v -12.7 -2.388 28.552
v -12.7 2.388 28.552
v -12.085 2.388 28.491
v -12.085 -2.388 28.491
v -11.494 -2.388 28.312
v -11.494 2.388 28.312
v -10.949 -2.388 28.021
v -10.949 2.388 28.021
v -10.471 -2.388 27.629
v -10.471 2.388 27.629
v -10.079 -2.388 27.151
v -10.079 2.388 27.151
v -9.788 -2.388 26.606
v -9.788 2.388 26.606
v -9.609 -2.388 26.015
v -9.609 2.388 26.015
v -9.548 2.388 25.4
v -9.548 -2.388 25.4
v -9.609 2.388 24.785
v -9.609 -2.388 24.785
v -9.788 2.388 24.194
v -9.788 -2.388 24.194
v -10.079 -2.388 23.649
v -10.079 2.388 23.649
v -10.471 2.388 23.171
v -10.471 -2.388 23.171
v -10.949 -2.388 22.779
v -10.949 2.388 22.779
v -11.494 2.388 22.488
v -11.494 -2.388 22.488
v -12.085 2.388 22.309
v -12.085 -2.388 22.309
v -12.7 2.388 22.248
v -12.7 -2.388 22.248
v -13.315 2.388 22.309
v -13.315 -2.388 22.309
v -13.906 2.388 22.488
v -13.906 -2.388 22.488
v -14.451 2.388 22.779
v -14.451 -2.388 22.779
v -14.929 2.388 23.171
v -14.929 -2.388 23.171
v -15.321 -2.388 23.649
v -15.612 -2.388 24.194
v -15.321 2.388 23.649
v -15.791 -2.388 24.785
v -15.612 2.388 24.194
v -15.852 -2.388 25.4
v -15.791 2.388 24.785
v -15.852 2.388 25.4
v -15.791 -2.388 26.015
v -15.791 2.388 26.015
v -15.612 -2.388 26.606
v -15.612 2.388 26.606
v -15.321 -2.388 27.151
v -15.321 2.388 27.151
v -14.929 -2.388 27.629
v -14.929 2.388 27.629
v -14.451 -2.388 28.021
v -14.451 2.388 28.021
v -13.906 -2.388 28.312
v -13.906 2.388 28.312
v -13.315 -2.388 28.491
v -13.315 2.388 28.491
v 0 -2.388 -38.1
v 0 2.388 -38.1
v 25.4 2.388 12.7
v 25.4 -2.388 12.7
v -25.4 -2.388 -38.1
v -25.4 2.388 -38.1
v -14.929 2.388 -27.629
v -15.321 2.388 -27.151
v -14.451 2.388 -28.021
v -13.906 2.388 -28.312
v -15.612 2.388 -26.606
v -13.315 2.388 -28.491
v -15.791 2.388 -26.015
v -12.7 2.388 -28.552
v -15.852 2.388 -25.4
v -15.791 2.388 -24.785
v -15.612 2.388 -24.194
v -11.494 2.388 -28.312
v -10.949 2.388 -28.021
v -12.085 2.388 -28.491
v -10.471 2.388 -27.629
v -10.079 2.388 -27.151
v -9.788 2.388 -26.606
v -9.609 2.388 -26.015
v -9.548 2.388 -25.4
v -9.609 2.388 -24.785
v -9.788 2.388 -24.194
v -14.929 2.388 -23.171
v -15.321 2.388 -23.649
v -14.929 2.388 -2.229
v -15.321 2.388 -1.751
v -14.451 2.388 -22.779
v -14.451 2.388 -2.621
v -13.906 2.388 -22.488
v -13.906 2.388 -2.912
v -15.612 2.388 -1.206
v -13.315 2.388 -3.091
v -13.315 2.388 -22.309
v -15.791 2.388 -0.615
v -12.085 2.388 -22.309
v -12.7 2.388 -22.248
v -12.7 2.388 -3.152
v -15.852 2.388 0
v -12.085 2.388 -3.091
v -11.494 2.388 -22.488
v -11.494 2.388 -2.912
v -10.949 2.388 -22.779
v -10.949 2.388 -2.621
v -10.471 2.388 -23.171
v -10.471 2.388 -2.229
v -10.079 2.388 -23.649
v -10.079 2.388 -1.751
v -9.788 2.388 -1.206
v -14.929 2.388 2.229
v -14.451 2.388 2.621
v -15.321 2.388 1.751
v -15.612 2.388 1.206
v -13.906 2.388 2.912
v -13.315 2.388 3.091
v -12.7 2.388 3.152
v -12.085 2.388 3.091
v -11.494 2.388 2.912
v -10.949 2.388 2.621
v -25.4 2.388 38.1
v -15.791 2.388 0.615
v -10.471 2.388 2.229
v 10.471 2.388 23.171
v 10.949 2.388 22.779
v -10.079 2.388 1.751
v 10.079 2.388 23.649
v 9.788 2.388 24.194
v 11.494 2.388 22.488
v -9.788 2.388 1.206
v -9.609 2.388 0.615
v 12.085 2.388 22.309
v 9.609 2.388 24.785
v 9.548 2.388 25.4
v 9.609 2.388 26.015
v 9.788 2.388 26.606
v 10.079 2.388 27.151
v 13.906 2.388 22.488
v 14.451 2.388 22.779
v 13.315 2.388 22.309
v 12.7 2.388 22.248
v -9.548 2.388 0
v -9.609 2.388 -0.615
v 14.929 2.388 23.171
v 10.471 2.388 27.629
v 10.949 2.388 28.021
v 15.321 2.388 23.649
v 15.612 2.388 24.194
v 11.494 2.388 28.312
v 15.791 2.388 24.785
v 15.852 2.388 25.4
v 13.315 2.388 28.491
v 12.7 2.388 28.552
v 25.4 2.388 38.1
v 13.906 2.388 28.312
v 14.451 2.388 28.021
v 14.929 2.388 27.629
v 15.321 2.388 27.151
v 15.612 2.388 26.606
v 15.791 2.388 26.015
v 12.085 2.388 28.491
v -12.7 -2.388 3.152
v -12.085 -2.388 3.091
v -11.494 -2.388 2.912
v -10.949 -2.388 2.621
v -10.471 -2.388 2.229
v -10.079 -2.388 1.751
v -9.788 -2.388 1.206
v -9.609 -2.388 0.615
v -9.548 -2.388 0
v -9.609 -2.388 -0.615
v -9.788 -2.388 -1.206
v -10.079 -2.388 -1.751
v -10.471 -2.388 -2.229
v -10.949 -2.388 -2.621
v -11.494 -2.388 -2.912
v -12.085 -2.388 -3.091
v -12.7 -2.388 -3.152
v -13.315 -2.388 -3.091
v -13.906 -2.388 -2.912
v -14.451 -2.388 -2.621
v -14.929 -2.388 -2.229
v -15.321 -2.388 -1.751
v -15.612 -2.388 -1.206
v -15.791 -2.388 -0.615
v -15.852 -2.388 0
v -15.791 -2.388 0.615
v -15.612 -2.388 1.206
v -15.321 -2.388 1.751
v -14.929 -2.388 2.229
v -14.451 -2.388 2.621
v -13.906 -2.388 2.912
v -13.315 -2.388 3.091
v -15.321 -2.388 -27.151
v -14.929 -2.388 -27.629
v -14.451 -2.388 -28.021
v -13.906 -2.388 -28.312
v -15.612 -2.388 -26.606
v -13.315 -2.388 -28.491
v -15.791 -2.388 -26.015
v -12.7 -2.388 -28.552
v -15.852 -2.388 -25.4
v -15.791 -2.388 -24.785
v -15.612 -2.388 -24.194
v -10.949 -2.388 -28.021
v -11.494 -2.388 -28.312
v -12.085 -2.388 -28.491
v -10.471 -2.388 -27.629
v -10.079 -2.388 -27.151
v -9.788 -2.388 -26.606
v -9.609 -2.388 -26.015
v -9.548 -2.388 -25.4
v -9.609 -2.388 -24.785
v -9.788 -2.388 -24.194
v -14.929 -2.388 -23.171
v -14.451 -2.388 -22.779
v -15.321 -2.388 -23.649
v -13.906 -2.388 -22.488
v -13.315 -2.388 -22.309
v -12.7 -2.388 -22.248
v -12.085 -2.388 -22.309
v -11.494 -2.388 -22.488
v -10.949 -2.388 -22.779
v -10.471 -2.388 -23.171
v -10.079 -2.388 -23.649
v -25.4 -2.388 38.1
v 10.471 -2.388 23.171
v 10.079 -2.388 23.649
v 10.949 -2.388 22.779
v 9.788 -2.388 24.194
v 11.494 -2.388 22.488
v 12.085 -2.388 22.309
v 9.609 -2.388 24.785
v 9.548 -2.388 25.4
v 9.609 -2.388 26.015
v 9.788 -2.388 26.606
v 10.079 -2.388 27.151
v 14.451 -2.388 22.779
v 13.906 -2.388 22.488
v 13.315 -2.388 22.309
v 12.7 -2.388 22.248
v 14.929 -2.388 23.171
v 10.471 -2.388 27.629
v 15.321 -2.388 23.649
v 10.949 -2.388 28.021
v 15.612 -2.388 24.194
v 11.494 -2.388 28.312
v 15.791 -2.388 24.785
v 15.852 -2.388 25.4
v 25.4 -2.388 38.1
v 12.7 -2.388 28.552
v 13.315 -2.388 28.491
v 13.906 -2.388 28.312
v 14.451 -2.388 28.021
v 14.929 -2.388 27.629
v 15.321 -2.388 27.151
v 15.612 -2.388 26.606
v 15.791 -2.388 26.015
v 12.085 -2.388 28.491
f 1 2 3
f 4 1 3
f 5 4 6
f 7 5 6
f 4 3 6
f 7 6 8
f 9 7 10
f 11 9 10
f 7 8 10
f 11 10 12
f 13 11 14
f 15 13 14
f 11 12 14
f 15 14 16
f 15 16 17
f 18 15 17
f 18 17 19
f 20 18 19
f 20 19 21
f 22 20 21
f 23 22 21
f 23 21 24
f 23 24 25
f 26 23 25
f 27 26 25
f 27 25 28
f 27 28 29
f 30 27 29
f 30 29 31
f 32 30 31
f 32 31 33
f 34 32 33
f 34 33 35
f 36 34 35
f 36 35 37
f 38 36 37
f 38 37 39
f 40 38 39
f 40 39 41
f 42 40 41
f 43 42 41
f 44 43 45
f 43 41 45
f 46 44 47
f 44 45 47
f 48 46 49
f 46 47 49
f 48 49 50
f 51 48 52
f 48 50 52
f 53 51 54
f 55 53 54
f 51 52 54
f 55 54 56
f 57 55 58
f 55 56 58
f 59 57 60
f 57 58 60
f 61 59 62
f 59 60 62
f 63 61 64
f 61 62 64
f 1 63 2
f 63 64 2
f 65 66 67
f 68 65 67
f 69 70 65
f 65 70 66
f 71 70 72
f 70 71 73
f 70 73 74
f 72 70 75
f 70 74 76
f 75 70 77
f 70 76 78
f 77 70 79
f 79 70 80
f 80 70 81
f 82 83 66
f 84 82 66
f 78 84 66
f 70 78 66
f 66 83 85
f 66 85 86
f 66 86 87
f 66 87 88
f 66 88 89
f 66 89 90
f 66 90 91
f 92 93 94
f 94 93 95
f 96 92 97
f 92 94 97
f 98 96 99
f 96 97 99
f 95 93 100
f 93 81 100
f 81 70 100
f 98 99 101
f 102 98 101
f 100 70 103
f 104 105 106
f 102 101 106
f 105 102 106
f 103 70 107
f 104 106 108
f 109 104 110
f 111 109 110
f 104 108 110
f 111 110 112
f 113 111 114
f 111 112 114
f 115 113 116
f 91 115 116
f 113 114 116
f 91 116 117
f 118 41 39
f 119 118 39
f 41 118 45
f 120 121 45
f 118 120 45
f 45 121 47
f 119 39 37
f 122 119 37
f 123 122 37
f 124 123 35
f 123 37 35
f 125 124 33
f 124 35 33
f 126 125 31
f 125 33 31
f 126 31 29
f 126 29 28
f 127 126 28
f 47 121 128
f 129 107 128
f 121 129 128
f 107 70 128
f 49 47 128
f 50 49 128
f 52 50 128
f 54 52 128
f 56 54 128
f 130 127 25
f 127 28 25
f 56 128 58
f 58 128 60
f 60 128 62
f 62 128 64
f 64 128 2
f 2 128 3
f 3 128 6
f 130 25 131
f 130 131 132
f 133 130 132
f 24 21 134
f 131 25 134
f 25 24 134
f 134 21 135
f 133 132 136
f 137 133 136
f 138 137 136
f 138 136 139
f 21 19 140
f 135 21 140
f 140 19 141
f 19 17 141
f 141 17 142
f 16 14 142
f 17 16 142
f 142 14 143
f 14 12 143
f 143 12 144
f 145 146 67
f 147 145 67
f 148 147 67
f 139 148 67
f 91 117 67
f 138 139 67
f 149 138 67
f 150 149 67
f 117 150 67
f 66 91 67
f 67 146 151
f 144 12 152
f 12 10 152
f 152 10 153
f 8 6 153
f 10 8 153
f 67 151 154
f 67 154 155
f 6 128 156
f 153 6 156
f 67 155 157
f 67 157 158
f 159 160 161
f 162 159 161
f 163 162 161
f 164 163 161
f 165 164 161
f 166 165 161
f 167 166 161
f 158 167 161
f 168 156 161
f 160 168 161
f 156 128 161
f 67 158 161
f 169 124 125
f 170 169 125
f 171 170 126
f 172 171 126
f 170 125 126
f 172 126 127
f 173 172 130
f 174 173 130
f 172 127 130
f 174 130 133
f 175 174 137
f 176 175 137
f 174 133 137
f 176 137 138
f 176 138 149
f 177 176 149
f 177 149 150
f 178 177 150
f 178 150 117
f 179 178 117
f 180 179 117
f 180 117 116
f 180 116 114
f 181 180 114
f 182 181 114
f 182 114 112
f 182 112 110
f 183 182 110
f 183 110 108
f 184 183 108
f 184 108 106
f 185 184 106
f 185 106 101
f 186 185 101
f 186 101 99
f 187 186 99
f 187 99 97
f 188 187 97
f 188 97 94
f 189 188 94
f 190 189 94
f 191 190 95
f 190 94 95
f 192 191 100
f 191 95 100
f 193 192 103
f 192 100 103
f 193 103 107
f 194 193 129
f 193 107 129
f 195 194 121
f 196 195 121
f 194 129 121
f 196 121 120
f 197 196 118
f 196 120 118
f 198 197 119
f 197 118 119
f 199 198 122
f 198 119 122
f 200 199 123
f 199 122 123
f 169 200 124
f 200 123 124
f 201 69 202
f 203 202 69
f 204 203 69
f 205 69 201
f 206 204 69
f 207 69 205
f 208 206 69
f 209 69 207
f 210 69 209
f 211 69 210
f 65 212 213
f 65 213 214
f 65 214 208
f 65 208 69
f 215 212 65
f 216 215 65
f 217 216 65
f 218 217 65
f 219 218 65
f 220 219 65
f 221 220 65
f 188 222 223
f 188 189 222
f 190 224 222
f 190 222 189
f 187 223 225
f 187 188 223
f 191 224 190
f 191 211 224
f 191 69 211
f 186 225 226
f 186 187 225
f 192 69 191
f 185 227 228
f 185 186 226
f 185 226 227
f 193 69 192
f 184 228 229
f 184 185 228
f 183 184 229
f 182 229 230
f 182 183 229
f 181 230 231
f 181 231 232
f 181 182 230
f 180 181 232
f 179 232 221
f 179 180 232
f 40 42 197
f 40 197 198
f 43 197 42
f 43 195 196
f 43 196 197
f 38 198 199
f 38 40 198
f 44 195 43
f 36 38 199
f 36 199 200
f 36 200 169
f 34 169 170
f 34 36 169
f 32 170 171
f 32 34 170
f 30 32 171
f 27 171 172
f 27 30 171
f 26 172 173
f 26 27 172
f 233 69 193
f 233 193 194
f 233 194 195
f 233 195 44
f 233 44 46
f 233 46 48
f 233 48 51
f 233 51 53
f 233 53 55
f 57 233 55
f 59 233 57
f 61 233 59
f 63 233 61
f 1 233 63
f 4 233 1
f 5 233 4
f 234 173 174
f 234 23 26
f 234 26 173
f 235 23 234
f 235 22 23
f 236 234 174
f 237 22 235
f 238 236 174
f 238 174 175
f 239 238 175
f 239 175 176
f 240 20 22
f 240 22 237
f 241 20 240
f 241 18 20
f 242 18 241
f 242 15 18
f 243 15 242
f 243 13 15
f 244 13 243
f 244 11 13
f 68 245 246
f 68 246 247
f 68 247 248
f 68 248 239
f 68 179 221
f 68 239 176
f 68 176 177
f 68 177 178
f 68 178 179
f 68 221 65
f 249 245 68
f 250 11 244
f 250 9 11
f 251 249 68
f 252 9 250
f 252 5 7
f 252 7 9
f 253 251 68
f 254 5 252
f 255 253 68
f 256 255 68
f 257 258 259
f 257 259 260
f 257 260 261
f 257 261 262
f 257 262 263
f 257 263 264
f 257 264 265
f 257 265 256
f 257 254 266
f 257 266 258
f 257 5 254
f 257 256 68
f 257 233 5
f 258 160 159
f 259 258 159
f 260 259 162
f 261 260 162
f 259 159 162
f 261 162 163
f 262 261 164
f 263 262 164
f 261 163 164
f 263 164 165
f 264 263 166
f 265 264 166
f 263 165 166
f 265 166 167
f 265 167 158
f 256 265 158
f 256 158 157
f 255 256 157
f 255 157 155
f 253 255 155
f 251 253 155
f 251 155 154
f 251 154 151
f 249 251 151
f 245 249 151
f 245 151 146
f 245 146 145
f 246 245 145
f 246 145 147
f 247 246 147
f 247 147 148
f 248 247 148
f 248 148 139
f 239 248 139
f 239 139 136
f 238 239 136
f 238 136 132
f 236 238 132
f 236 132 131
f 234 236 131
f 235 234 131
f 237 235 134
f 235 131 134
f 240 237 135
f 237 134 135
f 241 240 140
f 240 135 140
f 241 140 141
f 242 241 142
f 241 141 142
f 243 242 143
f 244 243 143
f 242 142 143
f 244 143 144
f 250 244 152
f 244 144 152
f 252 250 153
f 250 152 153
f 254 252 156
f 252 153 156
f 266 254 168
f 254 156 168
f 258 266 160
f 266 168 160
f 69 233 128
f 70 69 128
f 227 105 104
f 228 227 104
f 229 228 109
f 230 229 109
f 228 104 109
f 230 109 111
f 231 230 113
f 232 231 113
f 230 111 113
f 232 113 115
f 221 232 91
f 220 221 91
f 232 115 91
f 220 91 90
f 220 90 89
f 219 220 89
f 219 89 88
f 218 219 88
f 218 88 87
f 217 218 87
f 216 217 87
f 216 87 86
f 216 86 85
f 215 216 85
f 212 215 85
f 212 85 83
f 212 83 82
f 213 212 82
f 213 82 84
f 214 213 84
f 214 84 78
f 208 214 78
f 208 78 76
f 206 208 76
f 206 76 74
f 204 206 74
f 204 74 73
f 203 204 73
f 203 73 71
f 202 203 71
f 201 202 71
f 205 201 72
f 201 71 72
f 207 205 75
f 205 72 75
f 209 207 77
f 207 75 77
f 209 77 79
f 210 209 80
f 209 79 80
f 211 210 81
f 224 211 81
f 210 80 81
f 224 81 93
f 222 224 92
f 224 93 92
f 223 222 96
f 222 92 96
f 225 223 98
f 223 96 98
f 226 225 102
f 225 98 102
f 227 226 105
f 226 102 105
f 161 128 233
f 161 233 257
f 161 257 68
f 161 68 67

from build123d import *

# Parameters (mm, degrees)
SKETCH1_W            = 50.8
SKETCH1_H            = 4.7752
BOSS_EXTRUDE1_DEPTH  = 38.1
CUT_EXTRUDE2_DEPTH   = 7.62
SKETCH9_R            = 3.151882158
CUT_EXTRUDE3_DEPTH   = 47.038815526
LPATTERN1_COUNT      = 3
LPATTERN1_PITCH      = 25.4
LPATTERN1_COUNT_DIR2 = 2
LPATTERN1_PITCH_DIR2 = 25.4


with BuildPart() as part:
    # Sketch1 → Boss-Extrude1 (new, symmetric)
    with BuildSketch(Plane.XY):
        Rectangle(SKETCH1_W, SKETCH1_H)
    extrude(amount=BOSS_EXTRUDE1_DEPTH, both=True)

    # Sketch8 → Cut-Extrude2 (cut)
    with BuildSketch(Plane(origin=(0, 2.3876, 0), x_dir=(-1, 0, 0), z_dir=(0, 1, 0))):
        Polygon((0, -38.1), (-25.4, 12.7), (-25.4, -38.1), align=None)
    extrude(amount=-CUT_EXTRUDE2_DEPTH, mode=Mode.SUBTRACT)

    # Sketch9 → Cut-Extrude3 (cut, through all)
    with BuildSketch(Plane(origin=(0, 2.3876, 0), x_dir=(1, 0, 0), z_dir=(0, 1, 0))):
        with Locations(Location((-12.7, 25.4, 0), (0, 0, 270))):
            Circle(SKETCH9_R)
    cut_extrude3 = extrude(amount=-CUT_EXTRUDE3_DEPTH, mode=Mode.SUBTRACT)

    # LPattern1: Cut-Extrude3 3 × 2, 2 skipped
    with Locations(*[(j * LPATTERN1_PITCH_DIR2, 0, i * LPATTERN1_PITCH) for i in range(LPATTERN1_COUNT) for j in range(LPATTERN1_COUNT_DIR2) if (i, j) not in ((0, 0), (0, 1), (1, 1))]):
        add(cut_extrude3, mode=Mode.SUBTRACT)


solid = part.part
